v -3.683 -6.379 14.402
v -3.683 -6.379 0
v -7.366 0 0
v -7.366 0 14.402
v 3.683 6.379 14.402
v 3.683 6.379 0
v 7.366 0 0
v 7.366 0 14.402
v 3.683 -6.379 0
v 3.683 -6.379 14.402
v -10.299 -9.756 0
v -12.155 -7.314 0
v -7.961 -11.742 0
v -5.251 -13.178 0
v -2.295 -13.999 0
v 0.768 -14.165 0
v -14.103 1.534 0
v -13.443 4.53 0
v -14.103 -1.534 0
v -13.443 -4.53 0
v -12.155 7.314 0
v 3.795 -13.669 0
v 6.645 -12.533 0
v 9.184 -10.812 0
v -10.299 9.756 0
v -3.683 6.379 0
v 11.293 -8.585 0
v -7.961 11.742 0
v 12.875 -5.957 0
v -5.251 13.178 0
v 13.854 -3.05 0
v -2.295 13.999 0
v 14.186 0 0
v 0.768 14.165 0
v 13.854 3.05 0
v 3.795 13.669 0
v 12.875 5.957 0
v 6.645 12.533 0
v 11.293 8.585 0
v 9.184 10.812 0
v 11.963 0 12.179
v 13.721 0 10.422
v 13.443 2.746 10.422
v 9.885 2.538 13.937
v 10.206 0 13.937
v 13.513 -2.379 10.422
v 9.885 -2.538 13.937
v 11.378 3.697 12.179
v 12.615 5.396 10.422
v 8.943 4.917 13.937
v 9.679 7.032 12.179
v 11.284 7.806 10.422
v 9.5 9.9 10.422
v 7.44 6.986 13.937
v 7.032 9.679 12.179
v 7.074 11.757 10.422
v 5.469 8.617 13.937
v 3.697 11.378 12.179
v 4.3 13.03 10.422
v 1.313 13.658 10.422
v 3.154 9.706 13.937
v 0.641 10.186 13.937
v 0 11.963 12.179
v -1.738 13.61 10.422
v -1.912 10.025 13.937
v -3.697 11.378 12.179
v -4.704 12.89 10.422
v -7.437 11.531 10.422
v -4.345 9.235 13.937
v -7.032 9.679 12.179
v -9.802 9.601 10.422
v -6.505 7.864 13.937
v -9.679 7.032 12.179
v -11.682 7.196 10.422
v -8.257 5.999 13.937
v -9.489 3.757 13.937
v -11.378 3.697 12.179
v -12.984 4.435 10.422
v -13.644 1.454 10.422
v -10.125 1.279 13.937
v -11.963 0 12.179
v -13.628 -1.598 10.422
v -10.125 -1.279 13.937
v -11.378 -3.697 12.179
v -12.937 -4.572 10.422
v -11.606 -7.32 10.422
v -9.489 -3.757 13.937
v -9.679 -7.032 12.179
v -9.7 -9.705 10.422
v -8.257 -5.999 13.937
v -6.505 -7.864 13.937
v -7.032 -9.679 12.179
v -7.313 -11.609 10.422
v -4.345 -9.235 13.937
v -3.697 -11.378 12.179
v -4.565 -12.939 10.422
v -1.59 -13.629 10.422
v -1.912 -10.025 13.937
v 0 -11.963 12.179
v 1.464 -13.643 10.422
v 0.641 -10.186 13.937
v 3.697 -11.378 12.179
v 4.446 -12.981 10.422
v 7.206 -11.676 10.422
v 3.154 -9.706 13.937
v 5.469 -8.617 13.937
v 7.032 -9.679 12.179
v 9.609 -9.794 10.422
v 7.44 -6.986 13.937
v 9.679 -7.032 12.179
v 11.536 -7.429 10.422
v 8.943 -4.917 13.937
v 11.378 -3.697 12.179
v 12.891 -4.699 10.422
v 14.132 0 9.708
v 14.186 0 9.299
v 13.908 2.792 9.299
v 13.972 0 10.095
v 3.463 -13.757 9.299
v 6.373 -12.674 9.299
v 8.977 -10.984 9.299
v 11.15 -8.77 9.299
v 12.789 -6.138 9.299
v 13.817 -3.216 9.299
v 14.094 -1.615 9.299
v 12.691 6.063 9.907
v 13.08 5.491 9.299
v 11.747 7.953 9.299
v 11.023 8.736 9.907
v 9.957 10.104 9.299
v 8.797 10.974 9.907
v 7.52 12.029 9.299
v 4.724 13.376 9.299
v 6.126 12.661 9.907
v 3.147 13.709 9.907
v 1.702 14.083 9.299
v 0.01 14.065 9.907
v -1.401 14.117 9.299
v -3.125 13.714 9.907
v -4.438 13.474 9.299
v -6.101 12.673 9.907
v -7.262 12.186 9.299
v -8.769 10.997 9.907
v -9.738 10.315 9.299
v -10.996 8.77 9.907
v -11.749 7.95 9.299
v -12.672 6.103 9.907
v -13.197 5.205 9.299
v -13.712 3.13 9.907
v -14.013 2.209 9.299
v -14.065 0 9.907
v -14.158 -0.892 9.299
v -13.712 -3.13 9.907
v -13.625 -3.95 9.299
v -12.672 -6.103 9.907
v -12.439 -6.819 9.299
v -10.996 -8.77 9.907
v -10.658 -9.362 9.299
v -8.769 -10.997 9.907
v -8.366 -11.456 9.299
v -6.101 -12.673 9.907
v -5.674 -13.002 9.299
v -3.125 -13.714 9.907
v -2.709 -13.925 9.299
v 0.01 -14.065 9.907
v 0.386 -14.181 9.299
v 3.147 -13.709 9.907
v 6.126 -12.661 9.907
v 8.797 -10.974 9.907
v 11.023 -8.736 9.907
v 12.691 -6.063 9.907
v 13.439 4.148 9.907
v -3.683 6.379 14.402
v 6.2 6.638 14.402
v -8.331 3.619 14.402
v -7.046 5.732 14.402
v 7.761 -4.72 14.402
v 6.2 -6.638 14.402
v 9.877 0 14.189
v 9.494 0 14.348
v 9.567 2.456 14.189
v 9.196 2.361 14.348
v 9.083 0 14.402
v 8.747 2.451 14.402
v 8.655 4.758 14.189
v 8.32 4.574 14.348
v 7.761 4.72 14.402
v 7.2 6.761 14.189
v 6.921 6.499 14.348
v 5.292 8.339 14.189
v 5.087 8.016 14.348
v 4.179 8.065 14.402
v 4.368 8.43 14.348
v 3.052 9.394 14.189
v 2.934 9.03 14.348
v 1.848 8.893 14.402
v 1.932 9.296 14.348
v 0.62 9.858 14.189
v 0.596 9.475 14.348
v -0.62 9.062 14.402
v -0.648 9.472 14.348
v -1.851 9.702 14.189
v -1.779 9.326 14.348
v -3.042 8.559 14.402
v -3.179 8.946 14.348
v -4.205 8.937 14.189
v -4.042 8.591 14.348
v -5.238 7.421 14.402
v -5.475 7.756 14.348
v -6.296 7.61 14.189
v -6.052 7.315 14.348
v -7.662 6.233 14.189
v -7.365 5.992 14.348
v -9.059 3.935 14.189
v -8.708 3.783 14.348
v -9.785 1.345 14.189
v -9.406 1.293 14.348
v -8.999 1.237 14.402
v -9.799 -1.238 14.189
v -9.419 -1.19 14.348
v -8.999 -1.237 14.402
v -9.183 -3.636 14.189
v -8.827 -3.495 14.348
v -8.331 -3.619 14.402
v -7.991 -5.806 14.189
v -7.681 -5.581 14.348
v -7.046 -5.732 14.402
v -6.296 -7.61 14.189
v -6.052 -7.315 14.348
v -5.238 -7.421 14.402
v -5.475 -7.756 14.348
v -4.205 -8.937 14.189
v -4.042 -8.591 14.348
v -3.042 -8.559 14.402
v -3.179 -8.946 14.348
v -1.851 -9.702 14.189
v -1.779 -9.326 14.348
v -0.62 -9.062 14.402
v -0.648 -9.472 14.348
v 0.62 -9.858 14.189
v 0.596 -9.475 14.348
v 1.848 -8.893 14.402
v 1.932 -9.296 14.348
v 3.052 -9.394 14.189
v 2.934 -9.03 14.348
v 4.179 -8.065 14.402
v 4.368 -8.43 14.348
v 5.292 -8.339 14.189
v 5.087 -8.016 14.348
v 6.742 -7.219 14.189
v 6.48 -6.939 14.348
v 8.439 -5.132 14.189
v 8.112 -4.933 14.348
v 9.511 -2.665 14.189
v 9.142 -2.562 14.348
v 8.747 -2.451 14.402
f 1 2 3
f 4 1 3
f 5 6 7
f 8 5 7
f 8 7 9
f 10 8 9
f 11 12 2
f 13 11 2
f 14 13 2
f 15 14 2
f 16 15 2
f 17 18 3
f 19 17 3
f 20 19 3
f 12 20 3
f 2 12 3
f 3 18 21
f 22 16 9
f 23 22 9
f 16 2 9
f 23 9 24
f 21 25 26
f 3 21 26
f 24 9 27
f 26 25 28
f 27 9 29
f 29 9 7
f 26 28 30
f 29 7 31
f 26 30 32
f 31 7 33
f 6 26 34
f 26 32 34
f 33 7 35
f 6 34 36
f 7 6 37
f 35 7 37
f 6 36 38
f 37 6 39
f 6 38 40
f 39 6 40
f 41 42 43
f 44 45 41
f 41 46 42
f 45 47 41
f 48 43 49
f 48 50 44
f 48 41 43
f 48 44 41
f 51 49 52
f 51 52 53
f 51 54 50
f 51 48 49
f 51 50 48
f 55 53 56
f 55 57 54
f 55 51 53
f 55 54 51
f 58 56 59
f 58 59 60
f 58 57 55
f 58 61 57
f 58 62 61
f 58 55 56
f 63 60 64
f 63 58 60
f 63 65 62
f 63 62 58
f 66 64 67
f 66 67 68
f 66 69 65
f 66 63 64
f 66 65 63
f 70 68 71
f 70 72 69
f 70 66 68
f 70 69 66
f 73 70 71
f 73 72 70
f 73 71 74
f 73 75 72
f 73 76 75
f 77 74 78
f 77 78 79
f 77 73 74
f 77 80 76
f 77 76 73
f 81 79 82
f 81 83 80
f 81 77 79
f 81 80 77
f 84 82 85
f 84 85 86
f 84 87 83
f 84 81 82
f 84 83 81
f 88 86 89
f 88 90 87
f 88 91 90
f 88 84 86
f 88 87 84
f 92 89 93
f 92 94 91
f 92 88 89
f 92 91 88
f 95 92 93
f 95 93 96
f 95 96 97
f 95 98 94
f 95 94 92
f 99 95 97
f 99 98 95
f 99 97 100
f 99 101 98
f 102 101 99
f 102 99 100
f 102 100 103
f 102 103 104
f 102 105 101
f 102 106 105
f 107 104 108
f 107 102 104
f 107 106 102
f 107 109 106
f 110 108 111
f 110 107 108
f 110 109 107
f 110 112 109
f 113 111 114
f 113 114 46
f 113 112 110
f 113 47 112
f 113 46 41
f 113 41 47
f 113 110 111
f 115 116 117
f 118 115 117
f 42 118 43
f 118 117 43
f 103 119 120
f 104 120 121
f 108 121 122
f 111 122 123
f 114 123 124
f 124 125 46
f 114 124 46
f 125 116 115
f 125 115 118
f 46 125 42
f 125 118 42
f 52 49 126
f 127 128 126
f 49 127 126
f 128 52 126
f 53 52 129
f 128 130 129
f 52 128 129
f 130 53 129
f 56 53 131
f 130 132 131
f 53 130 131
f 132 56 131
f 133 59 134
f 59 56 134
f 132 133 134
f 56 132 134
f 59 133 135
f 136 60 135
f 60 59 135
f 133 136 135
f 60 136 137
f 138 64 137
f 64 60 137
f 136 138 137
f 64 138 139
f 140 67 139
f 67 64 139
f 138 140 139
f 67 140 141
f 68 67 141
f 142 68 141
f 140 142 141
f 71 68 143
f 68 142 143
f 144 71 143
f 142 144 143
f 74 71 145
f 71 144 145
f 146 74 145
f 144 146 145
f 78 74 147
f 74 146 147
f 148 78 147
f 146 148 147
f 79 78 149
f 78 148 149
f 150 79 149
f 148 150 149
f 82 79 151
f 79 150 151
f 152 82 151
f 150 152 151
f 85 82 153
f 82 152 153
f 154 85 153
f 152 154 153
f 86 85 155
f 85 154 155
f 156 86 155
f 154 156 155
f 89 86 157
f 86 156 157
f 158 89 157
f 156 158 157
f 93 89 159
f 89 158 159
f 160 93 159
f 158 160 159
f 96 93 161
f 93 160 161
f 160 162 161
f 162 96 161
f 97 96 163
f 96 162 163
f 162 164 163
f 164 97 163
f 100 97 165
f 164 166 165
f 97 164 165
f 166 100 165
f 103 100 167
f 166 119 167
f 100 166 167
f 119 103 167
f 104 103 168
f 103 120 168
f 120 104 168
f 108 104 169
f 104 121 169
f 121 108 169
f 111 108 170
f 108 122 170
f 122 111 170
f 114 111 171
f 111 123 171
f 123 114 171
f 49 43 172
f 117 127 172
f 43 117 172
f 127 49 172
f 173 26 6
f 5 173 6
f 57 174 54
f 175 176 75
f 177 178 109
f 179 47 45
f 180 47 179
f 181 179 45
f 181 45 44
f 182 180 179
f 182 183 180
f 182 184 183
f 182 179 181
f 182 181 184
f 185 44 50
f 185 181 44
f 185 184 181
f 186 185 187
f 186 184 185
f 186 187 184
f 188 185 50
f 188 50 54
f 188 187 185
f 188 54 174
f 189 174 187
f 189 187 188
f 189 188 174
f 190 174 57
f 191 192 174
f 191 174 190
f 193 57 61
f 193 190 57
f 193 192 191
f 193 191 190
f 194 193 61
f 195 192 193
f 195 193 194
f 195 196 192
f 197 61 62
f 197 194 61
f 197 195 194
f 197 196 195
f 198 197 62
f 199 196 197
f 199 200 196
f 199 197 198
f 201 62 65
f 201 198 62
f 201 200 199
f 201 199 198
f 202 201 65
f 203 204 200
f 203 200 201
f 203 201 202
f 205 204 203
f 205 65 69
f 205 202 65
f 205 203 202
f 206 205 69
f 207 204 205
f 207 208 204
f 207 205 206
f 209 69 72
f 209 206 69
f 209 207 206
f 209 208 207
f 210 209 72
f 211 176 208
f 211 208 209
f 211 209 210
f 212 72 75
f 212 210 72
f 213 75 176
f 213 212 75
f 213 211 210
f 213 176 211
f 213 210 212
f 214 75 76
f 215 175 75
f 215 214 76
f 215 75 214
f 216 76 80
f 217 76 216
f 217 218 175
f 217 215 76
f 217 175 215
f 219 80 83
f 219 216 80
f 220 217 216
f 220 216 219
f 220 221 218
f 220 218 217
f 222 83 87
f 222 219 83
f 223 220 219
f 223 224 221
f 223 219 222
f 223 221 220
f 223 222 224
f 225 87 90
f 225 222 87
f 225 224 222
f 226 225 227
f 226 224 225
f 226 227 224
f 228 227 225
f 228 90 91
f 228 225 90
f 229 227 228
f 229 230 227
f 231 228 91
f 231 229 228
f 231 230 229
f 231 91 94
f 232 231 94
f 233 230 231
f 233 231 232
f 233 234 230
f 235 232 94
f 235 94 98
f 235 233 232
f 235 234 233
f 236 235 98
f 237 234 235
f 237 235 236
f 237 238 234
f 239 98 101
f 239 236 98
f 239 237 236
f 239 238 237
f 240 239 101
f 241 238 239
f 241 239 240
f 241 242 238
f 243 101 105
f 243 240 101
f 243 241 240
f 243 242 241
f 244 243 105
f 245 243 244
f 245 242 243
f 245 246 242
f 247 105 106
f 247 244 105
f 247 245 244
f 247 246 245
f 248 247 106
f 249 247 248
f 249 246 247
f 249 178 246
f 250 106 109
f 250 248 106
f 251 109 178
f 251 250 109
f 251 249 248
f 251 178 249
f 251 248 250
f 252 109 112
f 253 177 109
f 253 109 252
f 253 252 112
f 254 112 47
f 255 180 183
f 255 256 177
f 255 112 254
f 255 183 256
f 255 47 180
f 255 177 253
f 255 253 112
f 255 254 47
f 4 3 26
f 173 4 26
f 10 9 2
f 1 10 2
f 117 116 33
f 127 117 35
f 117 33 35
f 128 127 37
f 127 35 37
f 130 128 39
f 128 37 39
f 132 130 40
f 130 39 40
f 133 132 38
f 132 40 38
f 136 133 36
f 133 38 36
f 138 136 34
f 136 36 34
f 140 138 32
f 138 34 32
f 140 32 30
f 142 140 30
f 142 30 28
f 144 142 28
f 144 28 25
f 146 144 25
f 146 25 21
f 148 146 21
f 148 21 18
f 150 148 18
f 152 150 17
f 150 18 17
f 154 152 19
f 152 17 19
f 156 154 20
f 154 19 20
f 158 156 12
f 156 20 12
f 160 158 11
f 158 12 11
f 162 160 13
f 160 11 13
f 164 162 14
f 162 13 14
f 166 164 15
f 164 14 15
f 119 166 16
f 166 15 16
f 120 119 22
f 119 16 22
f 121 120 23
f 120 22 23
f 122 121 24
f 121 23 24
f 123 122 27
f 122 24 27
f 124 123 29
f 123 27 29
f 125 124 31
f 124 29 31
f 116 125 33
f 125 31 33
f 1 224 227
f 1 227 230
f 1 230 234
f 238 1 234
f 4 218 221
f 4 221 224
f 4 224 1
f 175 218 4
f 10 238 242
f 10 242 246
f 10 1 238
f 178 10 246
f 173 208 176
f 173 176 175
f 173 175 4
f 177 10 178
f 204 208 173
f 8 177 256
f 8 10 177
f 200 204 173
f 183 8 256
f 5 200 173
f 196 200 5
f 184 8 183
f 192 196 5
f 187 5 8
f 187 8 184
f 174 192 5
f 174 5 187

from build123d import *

# Parameters (mm, degrees)
F0_R     = 14.1859
F1_DEPTH = 14.4018
F2_SIZE  = 4.445
F3_R     = 1.5875


# Not quite as in the source:
# - a feature names something its author has since deleted; it is built from what else it names


with BuildPart() as f1:
    # F0 (on Top) → F1 (new body)
    with BuildSketch(Plane.XY):
        Circle(F0_R)
        Polygon((-7.366, 0), (-3.683, 6.3791431243), (3.683, 6.3791431243), (7.366, 0), (3.683, -6.3791431243), (-3.683, -6.3791431243), align=None, mode=Mode.SUBTRACT)
    extrude(amount=F1_DEPTH)

    # F2
    f2_edges = [f1.edges().sort_by_distance(p)[0] for p in [
        (-14.1859, 0, 14.4018),
    ]]
    chamfer(f2_edges, length=F2_SIZE)

    # F3
    f3_edges = [f1.edges().sort_by_distance(p)[0] for p in [
        (-9.7409, 0, 14.4018),
        (-14.1859, 0, 9.9568),
    ]]
    fillet(f3_edges, radius=F3_R)


solid = f1.part
